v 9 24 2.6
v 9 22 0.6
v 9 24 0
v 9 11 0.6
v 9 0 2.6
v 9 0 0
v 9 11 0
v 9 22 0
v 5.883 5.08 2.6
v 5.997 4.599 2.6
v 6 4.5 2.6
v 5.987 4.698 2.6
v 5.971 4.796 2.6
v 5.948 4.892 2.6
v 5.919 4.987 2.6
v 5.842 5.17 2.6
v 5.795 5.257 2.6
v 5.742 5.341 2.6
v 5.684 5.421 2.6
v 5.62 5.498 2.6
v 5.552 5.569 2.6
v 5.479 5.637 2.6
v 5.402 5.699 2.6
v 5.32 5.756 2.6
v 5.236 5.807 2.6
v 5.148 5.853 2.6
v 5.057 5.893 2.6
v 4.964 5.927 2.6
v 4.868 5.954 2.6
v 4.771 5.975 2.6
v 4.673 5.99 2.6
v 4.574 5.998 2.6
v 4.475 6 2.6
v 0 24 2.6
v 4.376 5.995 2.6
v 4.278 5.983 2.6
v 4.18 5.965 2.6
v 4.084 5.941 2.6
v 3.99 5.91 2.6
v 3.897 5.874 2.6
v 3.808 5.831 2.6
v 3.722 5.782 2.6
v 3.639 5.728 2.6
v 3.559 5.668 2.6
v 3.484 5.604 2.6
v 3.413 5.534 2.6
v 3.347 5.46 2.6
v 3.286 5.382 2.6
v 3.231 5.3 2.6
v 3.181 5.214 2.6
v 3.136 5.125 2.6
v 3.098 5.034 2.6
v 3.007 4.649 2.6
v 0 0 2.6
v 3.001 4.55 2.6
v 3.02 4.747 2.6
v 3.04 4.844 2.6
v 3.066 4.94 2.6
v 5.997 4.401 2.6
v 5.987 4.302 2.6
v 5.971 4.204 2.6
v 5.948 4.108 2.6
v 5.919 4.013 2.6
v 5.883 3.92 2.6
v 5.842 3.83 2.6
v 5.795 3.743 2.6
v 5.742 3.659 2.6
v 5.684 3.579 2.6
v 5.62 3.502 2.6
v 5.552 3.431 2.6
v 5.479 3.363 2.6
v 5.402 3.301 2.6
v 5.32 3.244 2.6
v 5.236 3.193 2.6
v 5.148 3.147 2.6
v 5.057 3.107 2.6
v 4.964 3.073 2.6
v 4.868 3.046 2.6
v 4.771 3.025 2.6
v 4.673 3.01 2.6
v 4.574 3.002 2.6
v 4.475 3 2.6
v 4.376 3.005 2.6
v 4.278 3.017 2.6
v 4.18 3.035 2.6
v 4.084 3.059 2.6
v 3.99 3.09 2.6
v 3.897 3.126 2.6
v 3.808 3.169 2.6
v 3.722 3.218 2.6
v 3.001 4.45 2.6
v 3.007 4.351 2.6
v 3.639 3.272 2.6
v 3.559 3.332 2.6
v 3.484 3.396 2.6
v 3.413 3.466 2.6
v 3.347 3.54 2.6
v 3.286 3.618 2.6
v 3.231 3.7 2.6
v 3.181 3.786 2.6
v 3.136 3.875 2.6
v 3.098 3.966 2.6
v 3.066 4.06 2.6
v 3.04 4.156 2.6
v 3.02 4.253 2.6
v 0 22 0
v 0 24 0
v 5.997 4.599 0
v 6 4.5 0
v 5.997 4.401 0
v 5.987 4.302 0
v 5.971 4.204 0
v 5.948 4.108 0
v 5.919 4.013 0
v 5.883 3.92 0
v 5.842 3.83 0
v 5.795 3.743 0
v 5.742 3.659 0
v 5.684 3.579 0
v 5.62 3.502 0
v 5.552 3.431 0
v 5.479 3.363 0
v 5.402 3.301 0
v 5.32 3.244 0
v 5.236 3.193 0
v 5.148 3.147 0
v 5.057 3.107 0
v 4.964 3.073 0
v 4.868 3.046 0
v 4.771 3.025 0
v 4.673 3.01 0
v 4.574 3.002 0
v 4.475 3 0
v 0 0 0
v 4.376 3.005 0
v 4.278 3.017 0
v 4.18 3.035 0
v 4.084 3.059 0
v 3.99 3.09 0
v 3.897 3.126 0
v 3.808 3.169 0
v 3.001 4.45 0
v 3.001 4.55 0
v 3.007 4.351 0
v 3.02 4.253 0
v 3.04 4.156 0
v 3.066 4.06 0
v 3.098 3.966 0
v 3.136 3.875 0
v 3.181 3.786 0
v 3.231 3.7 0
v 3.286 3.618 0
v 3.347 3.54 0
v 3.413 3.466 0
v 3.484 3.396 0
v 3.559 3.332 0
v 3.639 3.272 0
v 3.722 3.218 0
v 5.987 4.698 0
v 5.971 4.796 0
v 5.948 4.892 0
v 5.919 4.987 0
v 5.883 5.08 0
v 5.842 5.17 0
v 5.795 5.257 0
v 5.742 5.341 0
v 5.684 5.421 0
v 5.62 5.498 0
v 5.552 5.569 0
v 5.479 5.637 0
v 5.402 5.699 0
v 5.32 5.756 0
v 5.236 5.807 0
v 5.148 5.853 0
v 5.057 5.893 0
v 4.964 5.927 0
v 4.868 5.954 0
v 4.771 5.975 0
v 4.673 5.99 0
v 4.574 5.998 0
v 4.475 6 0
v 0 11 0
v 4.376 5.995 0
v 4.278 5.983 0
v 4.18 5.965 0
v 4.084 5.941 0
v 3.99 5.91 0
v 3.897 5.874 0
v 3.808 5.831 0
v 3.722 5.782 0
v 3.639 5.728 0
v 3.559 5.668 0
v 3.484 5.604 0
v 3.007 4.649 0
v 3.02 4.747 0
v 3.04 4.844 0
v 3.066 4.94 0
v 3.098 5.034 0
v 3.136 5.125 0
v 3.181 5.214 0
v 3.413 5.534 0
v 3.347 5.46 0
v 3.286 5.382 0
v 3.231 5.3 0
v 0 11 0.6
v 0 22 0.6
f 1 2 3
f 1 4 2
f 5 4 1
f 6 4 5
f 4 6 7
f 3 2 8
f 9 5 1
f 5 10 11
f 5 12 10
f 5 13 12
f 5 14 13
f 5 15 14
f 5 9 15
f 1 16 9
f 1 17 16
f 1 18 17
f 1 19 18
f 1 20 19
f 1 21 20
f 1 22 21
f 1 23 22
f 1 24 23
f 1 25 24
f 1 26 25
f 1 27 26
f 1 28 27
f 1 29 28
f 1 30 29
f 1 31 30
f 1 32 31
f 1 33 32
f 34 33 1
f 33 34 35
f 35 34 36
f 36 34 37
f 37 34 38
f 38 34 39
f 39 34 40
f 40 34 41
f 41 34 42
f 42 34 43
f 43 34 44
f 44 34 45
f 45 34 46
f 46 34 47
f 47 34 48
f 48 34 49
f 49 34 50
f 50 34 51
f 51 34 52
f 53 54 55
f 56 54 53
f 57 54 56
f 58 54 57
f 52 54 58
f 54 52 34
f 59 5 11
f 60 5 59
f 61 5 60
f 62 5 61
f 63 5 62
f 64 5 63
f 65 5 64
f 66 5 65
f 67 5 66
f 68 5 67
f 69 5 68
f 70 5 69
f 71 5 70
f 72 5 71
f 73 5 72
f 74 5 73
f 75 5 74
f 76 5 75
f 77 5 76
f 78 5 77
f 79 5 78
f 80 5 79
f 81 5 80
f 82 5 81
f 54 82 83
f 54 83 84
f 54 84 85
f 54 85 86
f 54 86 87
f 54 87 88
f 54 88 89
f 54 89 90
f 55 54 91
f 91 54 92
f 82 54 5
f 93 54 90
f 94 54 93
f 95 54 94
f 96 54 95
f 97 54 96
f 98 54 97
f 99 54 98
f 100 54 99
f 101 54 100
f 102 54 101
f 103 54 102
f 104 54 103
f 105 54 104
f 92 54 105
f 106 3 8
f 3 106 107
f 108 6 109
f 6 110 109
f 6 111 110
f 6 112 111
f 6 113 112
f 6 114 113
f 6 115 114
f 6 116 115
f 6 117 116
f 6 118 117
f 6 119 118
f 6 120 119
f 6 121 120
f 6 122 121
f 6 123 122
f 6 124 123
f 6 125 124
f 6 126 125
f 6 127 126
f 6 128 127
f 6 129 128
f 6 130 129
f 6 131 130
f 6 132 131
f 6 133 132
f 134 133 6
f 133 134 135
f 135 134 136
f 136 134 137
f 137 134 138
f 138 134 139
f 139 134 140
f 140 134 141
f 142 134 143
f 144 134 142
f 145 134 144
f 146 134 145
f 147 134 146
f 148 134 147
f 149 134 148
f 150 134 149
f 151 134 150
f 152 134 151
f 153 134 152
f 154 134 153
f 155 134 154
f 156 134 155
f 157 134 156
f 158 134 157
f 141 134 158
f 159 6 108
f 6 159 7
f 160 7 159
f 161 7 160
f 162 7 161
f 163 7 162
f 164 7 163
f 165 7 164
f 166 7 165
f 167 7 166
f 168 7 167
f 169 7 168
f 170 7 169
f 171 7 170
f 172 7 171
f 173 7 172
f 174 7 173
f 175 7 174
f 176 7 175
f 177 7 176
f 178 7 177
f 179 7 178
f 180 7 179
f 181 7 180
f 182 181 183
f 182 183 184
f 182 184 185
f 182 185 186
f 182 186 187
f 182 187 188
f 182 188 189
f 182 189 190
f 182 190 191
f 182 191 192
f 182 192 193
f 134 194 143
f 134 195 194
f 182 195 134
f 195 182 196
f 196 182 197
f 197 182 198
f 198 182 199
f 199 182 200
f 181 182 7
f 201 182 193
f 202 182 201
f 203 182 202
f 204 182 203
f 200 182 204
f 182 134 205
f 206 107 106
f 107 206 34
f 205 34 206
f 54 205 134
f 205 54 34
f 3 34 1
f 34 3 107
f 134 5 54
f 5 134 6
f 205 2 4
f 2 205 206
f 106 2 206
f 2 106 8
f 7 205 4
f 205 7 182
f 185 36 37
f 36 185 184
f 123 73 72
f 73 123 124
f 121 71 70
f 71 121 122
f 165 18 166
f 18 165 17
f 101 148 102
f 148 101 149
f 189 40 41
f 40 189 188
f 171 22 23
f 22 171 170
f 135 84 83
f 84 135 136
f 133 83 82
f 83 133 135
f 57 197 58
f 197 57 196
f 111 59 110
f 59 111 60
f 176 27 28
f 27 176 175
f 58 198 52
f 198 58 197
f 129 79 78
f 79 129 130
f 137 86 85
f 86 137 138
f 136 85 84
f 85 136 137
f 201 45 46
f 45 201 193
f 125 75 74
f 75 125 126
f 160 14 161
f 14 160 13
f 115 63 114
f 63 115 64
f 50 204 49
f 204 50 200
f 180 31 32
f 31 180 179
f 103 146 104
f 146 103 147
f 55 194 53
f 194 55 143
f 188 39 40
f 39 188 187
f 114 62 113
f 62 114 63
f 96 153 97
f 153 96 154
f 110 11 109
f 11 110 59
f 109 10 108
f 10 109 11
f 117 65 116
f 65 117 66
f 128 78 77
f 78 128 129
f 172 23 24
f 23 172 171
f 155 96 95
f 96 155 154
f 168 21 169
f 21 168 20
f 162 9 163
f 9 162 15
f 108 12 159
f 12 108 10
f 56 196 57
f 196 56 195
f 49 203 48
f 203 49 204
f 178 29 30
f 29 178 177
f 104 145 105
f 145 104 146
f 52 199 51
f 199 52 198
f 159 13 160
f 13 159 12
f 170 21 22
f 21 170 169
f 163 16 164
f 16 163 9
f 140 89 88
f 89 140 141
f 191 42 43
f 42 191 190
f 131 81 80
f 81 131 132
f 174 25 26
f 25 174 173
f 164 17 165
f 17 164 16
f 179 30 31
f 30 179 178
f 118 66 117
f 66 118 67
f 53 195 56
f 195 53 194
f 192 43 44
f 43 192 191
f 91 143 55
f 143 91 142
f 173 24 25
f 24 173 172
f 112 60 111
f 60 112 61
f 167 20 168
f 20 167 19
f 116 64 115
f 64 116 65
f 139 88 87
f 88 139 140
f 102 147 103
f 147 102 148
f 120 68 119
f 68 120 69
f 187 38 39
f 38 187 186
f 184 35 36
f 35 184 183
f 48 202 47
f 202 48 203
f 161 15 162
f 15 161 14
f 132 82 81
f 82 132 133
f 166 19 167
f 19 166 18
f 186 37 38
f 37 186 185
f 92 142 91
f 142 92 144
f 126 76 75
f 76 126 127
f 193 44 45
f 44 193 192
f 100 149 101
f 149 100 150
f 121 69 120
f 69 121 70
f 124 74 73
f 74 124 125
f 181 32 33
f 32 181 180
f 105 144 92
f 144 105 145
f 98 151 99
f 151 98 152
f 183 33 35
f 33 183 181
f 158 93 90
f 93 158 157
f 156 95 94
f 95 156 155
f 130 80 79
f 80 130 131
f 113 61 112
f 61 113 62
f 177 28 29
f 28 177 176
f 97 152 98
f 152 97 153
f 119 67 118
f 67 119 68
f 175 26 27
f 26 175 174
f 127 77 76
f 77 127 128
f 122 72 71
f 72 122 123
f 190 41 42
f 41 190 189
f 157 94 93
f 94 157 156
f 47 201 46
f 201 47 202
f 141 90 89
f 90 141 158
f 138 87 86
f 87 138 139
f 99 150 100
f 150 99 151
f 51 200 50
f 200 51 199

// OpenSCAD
strip_width = 11;
strip_thickness = 0.6;
screw_diameter = 3;

$fa = 0.1;
$fs = 0.1;

difference(){
    cube([3 * screw_diameter, 3 * screw_diameter + 4 + strip_width, strip_thickness + 2]);
    translate([-1, 3 * screw_diameter + 2, -1]) cube([4 * screw_diameter, strip_width, strip_thickness + 1]);
    translate([1.5 * screw_diameter, 1.5 * screw_diameter, -1]) cylinder(h=strip_thickness + 4, d=screw_diameter);
}
